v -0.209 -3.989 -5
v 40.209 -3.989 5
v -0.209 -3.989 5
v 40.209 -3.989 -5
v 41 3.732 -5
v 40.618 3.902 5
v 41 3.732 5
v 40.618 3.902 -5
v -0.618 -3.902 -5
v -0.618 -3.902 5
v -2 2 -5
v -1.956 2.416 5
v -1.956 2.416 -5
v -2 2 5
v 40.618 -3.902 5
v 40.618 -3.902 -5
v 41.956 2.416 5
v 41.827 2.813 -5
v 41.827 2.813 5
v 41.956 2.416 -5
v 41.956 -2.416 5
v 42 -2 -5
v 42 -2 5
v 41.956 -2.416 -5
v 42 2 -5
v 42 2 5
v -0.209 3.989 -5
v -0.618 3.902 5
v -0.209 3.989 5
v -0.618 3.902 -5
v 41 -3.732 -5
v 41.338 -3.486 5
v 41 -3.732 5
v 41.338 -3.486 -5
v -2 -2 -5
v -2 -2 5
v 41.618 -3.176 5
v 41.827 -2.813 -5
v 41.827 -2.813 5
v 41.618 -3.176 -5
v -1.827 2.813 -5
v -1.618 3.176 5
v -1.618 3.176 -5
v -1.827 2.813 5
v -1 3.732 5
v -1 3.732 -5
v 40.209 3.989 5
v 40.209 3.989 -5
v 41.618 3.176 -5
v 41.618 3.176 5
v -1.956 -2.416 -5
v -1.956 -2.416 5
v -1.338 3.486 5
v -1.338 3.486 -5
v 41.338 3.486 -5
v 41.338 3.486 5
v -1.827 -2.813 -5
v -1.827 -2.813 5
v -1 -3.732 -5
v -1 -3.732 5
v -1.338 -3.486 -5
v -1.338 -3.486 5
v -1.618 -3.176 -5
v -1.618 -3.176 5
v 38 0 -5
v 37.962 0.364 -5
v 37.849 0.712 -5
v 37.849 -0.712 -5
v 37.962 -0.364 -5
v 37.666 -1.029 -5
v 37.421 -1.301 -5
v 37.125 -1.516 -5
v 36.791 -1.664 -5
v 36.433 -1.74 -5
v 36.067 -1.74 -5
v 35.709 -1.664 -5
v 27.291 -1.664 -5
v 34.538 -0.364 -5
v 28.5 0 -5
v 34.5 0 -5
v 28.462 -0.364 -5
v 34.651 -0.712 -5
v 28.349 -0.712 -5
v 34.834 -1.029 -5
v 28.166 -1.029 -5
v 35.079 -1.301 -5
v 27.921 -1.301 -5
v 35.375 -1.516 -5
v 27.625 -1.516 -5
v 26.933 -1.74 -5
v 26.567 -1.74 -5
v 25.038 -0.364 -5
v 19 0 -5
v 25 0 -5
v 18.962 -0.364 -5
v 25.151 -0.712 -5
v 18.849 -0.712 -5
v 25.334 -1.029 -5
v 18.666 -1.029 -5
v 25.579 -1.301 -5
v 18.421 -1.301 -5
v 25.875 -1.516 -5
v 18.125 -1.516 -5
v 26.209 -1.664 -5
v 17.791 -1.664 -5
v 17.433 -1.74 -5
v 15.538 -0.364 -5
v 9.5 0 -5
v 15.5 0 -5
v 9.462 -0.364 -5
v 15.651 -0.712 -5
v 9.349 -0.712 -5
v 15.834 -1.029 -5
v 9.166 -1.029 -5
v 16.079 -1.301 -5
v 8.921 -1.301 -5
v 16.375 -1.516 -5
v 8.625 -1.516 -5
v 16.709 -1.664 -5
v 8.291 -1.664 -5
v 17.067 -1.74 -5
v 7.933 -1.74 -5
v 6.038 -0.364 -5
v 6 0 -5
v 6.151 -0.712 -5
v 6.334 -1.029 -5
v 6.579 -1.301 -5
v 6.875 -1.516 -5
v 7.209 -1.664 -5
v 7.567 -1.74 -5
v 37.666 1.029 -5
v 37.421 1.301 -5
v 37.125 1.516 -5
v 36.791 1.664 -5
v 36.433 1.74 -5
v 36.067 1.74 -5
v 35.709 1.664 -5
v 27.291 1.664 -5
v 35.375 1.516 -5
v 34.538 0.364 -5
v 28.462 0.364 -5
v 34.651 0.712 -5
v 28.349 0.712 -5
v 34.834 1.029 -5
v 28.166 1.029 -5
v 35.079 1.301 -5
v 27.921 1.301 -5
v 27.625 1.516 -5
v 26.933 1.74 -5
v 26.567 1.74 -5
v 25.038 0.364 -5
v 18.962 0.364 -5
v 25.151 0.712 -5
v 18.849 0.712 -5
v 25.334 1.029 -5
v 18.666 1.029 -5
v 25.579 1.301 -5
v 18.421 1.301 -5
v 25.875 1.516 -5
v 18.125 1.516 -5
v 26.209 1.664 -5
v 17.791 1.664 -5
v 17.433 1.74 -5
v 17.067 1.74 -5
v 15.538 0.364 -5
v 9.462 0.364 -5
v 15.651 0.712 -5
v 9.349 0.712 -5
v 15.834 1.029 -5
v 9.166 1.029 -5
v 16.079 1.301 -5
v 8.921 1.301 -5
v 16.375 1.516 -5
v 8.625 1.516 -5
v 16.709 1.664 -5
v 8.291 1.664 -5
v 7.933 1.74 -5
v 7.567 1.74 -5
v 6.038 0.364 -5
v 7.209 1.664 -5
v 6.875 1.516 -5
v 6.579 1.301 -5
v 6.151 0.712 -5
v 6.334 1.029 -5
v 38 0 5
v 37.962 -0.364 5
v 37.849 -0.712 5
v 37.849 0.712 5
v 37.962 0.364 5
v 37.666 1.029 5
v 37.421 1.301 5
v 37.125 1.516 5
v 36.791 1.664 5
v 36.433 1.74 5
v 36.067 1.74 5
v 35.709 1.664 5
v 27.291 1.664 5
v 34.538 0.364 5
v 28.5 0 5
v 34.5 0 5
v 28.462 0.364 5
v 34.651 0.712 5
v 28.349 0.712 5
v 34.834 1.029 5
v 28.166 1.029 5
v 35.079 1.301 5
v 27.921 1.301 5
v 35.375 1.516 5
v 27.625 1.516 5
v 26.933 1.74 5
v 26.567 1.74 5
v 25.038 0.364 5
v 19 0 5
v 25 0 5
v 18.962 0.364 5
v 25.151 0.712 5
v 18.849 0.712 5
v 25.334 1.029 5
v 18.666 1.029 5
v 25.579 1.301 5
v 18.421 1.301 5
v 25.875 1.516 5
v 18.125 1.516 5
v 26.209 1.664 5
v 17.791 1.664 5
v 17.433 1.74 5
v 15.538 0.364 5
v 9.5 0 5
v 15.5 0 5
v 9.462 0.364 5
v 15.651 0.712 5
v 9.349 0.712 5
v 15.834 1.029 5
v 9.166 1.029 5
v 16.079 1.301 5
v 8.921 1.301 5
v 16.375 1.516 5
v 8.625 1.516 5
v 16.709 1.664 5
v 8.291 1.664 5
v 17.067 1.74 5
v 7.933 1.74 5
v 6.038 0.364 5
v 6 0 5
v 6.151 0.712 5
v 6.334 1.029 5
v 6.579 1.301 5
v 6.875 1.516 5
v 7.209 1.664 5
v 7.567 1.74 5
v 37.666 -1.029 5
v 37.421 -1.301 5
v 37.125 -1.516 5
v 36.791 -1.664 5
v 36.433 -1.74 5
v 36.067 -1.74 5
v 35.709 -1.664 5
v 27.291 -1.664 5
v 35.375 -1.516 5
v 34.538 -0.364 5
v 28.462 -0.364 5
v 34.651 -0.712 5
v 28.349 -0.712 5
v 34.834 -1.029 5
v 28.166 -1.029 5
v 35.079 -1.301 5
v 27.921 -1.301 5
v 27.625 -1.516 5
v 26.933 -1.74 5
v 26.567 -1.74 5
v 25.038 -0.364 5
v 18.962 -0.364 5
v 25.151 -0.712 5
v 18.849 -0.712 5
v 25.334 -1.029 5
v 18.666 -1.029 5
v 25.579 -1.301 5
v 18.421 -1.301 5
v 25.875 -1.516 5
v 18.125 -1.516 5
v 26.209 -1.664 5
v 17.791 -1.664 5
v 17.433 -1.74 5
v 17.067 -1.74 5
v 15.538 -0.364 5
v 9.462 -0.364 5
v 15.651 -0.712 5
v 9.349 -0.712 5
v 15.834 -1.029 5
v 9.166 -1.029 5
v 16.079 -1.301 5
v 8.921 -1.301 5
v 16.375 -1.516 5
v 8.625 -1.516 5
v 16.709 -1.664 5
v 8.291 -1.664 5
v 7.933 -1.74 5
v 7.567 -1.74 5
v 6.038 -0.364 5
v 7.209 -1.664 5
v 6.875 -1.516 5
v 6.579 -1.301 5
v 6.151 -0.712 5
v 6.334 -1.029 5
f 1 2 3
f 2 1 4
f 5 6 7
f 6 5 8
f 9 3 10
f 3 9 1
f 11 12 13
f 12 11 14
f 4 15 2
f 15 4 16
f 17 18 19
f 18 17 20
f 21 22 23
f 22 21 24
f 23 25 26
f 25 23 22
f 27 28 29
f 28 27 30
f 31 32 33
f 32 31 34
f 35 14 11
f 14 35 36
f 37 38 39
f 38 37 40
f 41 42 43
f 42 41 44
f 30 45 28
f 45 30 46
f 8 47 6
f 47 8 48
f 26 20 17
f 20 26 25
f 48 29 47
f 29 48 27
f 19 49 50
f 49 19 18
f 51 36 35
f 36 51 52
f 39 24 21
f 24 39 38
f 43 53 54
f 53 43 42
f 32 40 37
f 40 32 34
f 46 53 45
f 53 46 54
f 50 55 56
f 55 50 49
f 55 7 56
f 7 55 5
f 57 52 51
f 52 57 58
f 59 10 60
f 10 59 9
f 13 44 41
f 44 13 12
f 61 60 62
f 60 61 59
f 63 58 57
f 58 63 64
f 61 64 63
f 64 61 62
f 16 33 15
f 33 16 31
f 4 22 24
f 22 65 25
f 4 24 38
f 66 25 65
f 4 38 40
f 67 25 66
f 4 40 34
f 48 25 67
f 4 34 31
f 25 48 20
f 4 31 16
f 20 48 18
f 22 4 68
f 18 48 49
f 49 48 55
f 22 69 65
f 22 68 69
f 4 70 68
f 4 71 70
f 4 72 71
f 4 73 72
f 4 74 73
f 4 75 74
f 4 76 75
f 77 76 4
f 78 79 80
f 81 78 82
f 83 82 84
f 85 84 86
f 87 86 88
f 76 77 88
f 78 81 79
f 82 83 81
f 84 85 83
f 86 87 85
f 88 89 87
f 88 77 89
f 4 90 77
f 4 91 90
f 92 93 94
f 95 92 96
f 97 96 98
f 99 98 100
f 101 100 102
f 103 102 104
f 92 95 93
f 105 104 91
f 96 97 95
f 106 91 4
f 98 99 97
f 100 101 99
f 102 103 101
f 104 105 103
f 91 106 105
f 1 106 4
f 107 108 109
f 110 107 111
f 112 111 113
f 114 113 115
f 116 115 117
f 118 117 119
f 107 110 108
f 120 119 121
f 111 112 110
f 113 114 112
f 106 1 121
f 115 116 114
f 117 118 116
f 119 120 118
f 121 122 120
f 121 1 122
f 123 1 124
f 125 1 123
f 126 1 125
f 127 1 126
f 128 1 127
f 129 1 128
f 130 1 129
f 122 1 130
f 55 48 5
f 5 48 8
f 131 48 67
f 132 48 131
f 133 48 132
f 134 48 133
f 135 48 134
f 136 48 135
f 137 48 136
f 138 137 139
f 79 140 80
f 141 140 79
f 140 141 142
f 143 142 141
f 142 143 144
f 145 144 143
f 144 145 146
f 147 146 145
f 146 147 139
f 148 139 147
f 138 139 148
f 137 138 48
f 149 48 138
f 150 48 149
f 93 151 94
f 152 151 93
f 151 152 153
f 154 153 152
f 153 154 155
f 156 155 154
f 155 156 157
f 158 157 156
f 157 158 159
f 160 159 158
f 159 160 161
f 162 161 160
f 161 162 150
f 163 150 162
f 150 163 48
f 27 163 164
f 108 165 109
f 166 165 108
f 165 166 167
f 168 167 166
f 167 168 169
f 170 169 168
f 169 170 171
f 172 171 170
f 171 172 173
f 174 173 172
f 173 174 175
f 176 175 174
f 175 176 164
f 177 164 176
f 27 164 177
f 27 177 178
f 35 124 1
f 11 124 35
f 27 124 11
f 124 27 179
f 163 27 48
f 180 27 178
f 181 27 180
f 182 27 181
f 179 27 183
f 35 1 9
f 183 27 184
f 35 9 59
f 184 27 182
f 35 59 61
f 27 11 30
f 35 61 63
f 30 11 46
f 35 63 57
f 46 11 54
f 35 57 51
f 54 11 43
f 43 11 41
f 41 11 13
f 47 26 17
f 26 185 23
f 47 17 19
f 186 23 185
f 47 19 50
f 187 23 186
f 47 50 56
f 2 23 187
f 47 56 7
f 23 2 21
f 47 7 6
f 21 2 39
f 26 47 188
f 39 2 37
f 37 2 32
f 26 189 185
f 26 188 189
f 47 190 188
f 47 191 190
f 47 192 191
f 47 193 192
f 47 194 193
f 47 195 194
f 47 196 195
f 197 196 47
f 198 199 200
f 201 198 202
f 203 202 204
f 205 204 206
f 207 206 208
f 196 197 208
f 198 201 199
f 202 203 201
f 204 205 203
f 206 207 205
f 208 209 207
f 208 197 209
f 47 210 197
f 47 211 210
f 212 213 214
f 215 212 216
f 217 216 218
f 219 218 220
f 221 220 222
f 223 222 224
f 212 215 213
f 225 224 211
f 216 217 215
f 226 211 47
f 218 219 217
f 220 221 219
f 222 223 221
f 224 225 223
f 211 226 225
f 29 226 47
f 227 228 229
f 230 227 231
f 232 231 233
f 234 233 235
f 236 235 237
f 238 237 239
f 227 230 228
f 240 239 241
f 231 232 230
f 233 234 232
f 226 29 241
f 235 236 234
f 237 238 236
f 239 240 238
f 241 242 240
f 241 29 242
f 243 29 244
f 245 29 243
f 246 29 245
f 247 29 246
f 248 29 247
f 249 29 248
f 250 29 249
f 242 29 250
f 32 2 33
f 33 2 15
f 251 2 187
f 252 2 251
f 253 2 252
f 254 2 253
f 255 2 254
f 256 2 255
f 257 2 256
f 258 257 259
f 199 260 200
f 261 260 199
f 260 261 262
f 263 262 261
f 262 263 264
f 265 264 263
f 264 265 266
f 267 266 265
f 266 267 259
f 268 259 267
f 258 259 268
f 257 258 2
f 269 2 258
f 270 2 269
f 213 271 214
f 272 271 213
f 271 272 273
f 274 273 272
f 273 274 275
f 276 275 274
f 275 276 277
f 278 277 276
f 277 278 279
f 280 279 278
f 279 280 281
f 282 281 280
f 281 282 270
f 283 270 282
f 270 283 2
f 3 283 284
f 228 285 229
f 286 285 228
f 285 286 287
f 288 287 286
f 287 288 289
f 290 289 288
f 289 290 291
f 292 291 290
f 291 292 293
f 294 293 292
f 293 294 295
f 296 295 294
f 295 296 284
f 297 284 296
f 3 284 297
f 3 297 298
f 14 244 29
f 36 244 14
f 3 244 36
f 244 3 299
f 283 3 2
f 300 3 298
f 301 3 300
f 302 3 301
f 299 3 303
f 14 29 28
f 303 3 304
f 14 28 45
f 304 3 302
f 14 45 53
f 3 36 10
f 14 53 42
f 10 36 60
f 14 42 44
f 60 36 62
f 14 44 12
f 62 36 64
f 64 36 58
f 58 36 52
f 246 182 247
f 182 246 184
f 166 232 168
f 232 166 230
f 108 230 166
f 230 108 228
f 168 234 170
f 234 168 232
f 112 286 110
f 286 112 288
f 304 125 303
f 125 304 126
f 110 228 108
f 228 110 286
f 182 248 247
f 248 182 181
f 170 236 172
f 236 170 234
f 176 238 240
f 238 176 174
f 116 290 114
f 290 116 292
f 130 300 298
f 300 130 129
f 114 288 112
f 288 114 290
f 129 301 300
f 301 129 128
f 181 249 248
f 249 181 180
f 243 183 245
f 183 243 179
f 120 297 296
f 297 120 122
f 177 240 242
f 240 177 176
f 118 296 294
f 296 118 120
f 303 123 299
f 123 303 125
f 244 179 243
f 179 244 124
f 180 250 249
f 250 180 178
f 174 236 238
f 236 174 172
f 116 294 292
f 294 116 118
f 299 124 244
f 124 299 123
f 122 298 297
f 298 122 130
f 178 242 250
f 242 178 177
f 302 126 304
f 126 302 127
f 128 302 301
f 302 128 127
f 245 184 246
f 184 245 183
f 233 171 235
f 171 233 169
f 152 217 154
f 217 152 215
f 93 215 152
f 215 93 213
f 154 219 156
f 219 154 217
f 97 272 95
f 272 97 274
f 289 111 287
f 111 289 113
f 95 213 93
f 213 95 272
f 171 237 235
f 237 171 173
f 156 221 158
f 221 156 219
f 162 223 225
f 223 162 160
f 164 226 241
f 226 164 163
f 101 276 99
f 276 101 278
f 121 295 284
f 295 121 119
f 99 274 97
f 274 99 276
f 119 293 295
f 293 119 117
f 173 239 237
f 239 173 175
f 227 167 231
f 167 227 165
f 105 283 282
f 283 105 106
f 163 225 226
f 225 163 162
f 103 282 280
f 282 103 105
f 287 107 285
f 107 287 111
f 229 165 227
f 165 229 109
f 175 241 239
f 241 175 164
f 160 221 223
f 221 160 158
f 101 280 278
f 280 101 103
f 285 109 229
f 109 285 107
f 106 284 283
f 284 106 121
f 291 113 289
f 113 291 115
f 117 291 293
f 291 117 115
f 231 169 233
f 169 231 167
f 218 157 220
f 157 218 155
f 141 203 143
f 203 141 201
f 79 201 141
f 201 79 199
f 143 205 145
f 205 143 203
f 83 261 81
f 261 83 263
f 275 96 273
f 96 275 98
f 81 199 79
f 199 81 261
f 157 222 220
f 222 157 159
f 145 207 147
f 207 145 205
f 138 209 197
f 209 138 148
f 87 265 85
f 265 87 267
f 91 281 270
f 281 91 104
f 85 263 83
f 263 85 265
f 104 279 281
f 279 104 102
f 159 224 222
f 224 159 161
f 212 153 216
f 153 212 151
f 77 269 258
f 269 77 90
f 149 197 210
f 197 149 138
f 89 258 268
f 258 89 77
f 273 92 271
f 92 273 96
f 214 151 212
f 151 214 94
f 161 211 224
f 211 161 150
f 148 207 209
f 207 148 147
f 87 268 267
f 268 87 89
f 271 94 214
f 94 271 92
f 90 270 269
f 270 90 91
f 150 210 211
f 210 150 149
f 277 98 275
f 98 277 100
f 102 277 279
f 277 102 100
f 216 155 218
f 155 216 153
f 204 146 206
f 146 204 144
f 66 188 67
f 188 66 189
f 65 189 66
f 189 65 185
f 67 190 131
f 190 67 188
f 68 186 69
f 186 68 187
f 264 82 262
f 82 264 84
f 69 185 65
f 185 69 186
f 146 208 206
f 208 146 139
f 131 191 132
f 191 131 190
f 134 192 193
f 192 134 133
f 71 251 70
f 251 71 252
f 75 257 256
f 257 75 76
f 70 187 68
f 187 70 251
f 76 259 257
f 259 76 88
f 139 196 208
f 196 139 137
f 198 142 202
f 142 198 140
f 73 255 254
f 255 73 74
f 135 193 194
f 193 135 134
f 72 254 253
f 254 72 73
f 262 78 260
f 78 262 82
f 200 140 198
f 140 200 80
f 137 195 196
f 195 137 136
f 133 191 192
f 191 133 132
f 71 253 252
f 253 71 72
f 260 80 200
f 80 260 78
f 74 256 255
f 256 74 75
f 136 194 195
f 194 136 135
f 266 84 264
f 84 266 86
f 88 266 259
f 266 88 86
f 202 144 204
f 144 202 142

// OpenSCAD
$fn=30;
height=10;
radius=2;
difference(){
    hull(){
        translate([0,-2,0])cylinder(r=radius,h=height, center=true);
        translate([40,2,0])cylinder(r=radius,h=height, center=true);
        translate([0,2,0])cylinder(r=radius,h=height, center=true);
        translate([40,-2,0])cylinder(r=radius,h=height, center=true);
  }
    translate([7.75,0,0])cylinder(d=radius/0.5714285714,h=height*10, center=true);
    translate([17.25,0,0])cylinder(d=radius/0.5714285714,h=height*10, center=true);
    translate([26.75,0,0])cylinder(d=radius/0.5714285714,h=height*10, center=true);
    translate([36.25,0,0])cylinder(d=radius/0.5714285714,h=height*10, center=true);
}
